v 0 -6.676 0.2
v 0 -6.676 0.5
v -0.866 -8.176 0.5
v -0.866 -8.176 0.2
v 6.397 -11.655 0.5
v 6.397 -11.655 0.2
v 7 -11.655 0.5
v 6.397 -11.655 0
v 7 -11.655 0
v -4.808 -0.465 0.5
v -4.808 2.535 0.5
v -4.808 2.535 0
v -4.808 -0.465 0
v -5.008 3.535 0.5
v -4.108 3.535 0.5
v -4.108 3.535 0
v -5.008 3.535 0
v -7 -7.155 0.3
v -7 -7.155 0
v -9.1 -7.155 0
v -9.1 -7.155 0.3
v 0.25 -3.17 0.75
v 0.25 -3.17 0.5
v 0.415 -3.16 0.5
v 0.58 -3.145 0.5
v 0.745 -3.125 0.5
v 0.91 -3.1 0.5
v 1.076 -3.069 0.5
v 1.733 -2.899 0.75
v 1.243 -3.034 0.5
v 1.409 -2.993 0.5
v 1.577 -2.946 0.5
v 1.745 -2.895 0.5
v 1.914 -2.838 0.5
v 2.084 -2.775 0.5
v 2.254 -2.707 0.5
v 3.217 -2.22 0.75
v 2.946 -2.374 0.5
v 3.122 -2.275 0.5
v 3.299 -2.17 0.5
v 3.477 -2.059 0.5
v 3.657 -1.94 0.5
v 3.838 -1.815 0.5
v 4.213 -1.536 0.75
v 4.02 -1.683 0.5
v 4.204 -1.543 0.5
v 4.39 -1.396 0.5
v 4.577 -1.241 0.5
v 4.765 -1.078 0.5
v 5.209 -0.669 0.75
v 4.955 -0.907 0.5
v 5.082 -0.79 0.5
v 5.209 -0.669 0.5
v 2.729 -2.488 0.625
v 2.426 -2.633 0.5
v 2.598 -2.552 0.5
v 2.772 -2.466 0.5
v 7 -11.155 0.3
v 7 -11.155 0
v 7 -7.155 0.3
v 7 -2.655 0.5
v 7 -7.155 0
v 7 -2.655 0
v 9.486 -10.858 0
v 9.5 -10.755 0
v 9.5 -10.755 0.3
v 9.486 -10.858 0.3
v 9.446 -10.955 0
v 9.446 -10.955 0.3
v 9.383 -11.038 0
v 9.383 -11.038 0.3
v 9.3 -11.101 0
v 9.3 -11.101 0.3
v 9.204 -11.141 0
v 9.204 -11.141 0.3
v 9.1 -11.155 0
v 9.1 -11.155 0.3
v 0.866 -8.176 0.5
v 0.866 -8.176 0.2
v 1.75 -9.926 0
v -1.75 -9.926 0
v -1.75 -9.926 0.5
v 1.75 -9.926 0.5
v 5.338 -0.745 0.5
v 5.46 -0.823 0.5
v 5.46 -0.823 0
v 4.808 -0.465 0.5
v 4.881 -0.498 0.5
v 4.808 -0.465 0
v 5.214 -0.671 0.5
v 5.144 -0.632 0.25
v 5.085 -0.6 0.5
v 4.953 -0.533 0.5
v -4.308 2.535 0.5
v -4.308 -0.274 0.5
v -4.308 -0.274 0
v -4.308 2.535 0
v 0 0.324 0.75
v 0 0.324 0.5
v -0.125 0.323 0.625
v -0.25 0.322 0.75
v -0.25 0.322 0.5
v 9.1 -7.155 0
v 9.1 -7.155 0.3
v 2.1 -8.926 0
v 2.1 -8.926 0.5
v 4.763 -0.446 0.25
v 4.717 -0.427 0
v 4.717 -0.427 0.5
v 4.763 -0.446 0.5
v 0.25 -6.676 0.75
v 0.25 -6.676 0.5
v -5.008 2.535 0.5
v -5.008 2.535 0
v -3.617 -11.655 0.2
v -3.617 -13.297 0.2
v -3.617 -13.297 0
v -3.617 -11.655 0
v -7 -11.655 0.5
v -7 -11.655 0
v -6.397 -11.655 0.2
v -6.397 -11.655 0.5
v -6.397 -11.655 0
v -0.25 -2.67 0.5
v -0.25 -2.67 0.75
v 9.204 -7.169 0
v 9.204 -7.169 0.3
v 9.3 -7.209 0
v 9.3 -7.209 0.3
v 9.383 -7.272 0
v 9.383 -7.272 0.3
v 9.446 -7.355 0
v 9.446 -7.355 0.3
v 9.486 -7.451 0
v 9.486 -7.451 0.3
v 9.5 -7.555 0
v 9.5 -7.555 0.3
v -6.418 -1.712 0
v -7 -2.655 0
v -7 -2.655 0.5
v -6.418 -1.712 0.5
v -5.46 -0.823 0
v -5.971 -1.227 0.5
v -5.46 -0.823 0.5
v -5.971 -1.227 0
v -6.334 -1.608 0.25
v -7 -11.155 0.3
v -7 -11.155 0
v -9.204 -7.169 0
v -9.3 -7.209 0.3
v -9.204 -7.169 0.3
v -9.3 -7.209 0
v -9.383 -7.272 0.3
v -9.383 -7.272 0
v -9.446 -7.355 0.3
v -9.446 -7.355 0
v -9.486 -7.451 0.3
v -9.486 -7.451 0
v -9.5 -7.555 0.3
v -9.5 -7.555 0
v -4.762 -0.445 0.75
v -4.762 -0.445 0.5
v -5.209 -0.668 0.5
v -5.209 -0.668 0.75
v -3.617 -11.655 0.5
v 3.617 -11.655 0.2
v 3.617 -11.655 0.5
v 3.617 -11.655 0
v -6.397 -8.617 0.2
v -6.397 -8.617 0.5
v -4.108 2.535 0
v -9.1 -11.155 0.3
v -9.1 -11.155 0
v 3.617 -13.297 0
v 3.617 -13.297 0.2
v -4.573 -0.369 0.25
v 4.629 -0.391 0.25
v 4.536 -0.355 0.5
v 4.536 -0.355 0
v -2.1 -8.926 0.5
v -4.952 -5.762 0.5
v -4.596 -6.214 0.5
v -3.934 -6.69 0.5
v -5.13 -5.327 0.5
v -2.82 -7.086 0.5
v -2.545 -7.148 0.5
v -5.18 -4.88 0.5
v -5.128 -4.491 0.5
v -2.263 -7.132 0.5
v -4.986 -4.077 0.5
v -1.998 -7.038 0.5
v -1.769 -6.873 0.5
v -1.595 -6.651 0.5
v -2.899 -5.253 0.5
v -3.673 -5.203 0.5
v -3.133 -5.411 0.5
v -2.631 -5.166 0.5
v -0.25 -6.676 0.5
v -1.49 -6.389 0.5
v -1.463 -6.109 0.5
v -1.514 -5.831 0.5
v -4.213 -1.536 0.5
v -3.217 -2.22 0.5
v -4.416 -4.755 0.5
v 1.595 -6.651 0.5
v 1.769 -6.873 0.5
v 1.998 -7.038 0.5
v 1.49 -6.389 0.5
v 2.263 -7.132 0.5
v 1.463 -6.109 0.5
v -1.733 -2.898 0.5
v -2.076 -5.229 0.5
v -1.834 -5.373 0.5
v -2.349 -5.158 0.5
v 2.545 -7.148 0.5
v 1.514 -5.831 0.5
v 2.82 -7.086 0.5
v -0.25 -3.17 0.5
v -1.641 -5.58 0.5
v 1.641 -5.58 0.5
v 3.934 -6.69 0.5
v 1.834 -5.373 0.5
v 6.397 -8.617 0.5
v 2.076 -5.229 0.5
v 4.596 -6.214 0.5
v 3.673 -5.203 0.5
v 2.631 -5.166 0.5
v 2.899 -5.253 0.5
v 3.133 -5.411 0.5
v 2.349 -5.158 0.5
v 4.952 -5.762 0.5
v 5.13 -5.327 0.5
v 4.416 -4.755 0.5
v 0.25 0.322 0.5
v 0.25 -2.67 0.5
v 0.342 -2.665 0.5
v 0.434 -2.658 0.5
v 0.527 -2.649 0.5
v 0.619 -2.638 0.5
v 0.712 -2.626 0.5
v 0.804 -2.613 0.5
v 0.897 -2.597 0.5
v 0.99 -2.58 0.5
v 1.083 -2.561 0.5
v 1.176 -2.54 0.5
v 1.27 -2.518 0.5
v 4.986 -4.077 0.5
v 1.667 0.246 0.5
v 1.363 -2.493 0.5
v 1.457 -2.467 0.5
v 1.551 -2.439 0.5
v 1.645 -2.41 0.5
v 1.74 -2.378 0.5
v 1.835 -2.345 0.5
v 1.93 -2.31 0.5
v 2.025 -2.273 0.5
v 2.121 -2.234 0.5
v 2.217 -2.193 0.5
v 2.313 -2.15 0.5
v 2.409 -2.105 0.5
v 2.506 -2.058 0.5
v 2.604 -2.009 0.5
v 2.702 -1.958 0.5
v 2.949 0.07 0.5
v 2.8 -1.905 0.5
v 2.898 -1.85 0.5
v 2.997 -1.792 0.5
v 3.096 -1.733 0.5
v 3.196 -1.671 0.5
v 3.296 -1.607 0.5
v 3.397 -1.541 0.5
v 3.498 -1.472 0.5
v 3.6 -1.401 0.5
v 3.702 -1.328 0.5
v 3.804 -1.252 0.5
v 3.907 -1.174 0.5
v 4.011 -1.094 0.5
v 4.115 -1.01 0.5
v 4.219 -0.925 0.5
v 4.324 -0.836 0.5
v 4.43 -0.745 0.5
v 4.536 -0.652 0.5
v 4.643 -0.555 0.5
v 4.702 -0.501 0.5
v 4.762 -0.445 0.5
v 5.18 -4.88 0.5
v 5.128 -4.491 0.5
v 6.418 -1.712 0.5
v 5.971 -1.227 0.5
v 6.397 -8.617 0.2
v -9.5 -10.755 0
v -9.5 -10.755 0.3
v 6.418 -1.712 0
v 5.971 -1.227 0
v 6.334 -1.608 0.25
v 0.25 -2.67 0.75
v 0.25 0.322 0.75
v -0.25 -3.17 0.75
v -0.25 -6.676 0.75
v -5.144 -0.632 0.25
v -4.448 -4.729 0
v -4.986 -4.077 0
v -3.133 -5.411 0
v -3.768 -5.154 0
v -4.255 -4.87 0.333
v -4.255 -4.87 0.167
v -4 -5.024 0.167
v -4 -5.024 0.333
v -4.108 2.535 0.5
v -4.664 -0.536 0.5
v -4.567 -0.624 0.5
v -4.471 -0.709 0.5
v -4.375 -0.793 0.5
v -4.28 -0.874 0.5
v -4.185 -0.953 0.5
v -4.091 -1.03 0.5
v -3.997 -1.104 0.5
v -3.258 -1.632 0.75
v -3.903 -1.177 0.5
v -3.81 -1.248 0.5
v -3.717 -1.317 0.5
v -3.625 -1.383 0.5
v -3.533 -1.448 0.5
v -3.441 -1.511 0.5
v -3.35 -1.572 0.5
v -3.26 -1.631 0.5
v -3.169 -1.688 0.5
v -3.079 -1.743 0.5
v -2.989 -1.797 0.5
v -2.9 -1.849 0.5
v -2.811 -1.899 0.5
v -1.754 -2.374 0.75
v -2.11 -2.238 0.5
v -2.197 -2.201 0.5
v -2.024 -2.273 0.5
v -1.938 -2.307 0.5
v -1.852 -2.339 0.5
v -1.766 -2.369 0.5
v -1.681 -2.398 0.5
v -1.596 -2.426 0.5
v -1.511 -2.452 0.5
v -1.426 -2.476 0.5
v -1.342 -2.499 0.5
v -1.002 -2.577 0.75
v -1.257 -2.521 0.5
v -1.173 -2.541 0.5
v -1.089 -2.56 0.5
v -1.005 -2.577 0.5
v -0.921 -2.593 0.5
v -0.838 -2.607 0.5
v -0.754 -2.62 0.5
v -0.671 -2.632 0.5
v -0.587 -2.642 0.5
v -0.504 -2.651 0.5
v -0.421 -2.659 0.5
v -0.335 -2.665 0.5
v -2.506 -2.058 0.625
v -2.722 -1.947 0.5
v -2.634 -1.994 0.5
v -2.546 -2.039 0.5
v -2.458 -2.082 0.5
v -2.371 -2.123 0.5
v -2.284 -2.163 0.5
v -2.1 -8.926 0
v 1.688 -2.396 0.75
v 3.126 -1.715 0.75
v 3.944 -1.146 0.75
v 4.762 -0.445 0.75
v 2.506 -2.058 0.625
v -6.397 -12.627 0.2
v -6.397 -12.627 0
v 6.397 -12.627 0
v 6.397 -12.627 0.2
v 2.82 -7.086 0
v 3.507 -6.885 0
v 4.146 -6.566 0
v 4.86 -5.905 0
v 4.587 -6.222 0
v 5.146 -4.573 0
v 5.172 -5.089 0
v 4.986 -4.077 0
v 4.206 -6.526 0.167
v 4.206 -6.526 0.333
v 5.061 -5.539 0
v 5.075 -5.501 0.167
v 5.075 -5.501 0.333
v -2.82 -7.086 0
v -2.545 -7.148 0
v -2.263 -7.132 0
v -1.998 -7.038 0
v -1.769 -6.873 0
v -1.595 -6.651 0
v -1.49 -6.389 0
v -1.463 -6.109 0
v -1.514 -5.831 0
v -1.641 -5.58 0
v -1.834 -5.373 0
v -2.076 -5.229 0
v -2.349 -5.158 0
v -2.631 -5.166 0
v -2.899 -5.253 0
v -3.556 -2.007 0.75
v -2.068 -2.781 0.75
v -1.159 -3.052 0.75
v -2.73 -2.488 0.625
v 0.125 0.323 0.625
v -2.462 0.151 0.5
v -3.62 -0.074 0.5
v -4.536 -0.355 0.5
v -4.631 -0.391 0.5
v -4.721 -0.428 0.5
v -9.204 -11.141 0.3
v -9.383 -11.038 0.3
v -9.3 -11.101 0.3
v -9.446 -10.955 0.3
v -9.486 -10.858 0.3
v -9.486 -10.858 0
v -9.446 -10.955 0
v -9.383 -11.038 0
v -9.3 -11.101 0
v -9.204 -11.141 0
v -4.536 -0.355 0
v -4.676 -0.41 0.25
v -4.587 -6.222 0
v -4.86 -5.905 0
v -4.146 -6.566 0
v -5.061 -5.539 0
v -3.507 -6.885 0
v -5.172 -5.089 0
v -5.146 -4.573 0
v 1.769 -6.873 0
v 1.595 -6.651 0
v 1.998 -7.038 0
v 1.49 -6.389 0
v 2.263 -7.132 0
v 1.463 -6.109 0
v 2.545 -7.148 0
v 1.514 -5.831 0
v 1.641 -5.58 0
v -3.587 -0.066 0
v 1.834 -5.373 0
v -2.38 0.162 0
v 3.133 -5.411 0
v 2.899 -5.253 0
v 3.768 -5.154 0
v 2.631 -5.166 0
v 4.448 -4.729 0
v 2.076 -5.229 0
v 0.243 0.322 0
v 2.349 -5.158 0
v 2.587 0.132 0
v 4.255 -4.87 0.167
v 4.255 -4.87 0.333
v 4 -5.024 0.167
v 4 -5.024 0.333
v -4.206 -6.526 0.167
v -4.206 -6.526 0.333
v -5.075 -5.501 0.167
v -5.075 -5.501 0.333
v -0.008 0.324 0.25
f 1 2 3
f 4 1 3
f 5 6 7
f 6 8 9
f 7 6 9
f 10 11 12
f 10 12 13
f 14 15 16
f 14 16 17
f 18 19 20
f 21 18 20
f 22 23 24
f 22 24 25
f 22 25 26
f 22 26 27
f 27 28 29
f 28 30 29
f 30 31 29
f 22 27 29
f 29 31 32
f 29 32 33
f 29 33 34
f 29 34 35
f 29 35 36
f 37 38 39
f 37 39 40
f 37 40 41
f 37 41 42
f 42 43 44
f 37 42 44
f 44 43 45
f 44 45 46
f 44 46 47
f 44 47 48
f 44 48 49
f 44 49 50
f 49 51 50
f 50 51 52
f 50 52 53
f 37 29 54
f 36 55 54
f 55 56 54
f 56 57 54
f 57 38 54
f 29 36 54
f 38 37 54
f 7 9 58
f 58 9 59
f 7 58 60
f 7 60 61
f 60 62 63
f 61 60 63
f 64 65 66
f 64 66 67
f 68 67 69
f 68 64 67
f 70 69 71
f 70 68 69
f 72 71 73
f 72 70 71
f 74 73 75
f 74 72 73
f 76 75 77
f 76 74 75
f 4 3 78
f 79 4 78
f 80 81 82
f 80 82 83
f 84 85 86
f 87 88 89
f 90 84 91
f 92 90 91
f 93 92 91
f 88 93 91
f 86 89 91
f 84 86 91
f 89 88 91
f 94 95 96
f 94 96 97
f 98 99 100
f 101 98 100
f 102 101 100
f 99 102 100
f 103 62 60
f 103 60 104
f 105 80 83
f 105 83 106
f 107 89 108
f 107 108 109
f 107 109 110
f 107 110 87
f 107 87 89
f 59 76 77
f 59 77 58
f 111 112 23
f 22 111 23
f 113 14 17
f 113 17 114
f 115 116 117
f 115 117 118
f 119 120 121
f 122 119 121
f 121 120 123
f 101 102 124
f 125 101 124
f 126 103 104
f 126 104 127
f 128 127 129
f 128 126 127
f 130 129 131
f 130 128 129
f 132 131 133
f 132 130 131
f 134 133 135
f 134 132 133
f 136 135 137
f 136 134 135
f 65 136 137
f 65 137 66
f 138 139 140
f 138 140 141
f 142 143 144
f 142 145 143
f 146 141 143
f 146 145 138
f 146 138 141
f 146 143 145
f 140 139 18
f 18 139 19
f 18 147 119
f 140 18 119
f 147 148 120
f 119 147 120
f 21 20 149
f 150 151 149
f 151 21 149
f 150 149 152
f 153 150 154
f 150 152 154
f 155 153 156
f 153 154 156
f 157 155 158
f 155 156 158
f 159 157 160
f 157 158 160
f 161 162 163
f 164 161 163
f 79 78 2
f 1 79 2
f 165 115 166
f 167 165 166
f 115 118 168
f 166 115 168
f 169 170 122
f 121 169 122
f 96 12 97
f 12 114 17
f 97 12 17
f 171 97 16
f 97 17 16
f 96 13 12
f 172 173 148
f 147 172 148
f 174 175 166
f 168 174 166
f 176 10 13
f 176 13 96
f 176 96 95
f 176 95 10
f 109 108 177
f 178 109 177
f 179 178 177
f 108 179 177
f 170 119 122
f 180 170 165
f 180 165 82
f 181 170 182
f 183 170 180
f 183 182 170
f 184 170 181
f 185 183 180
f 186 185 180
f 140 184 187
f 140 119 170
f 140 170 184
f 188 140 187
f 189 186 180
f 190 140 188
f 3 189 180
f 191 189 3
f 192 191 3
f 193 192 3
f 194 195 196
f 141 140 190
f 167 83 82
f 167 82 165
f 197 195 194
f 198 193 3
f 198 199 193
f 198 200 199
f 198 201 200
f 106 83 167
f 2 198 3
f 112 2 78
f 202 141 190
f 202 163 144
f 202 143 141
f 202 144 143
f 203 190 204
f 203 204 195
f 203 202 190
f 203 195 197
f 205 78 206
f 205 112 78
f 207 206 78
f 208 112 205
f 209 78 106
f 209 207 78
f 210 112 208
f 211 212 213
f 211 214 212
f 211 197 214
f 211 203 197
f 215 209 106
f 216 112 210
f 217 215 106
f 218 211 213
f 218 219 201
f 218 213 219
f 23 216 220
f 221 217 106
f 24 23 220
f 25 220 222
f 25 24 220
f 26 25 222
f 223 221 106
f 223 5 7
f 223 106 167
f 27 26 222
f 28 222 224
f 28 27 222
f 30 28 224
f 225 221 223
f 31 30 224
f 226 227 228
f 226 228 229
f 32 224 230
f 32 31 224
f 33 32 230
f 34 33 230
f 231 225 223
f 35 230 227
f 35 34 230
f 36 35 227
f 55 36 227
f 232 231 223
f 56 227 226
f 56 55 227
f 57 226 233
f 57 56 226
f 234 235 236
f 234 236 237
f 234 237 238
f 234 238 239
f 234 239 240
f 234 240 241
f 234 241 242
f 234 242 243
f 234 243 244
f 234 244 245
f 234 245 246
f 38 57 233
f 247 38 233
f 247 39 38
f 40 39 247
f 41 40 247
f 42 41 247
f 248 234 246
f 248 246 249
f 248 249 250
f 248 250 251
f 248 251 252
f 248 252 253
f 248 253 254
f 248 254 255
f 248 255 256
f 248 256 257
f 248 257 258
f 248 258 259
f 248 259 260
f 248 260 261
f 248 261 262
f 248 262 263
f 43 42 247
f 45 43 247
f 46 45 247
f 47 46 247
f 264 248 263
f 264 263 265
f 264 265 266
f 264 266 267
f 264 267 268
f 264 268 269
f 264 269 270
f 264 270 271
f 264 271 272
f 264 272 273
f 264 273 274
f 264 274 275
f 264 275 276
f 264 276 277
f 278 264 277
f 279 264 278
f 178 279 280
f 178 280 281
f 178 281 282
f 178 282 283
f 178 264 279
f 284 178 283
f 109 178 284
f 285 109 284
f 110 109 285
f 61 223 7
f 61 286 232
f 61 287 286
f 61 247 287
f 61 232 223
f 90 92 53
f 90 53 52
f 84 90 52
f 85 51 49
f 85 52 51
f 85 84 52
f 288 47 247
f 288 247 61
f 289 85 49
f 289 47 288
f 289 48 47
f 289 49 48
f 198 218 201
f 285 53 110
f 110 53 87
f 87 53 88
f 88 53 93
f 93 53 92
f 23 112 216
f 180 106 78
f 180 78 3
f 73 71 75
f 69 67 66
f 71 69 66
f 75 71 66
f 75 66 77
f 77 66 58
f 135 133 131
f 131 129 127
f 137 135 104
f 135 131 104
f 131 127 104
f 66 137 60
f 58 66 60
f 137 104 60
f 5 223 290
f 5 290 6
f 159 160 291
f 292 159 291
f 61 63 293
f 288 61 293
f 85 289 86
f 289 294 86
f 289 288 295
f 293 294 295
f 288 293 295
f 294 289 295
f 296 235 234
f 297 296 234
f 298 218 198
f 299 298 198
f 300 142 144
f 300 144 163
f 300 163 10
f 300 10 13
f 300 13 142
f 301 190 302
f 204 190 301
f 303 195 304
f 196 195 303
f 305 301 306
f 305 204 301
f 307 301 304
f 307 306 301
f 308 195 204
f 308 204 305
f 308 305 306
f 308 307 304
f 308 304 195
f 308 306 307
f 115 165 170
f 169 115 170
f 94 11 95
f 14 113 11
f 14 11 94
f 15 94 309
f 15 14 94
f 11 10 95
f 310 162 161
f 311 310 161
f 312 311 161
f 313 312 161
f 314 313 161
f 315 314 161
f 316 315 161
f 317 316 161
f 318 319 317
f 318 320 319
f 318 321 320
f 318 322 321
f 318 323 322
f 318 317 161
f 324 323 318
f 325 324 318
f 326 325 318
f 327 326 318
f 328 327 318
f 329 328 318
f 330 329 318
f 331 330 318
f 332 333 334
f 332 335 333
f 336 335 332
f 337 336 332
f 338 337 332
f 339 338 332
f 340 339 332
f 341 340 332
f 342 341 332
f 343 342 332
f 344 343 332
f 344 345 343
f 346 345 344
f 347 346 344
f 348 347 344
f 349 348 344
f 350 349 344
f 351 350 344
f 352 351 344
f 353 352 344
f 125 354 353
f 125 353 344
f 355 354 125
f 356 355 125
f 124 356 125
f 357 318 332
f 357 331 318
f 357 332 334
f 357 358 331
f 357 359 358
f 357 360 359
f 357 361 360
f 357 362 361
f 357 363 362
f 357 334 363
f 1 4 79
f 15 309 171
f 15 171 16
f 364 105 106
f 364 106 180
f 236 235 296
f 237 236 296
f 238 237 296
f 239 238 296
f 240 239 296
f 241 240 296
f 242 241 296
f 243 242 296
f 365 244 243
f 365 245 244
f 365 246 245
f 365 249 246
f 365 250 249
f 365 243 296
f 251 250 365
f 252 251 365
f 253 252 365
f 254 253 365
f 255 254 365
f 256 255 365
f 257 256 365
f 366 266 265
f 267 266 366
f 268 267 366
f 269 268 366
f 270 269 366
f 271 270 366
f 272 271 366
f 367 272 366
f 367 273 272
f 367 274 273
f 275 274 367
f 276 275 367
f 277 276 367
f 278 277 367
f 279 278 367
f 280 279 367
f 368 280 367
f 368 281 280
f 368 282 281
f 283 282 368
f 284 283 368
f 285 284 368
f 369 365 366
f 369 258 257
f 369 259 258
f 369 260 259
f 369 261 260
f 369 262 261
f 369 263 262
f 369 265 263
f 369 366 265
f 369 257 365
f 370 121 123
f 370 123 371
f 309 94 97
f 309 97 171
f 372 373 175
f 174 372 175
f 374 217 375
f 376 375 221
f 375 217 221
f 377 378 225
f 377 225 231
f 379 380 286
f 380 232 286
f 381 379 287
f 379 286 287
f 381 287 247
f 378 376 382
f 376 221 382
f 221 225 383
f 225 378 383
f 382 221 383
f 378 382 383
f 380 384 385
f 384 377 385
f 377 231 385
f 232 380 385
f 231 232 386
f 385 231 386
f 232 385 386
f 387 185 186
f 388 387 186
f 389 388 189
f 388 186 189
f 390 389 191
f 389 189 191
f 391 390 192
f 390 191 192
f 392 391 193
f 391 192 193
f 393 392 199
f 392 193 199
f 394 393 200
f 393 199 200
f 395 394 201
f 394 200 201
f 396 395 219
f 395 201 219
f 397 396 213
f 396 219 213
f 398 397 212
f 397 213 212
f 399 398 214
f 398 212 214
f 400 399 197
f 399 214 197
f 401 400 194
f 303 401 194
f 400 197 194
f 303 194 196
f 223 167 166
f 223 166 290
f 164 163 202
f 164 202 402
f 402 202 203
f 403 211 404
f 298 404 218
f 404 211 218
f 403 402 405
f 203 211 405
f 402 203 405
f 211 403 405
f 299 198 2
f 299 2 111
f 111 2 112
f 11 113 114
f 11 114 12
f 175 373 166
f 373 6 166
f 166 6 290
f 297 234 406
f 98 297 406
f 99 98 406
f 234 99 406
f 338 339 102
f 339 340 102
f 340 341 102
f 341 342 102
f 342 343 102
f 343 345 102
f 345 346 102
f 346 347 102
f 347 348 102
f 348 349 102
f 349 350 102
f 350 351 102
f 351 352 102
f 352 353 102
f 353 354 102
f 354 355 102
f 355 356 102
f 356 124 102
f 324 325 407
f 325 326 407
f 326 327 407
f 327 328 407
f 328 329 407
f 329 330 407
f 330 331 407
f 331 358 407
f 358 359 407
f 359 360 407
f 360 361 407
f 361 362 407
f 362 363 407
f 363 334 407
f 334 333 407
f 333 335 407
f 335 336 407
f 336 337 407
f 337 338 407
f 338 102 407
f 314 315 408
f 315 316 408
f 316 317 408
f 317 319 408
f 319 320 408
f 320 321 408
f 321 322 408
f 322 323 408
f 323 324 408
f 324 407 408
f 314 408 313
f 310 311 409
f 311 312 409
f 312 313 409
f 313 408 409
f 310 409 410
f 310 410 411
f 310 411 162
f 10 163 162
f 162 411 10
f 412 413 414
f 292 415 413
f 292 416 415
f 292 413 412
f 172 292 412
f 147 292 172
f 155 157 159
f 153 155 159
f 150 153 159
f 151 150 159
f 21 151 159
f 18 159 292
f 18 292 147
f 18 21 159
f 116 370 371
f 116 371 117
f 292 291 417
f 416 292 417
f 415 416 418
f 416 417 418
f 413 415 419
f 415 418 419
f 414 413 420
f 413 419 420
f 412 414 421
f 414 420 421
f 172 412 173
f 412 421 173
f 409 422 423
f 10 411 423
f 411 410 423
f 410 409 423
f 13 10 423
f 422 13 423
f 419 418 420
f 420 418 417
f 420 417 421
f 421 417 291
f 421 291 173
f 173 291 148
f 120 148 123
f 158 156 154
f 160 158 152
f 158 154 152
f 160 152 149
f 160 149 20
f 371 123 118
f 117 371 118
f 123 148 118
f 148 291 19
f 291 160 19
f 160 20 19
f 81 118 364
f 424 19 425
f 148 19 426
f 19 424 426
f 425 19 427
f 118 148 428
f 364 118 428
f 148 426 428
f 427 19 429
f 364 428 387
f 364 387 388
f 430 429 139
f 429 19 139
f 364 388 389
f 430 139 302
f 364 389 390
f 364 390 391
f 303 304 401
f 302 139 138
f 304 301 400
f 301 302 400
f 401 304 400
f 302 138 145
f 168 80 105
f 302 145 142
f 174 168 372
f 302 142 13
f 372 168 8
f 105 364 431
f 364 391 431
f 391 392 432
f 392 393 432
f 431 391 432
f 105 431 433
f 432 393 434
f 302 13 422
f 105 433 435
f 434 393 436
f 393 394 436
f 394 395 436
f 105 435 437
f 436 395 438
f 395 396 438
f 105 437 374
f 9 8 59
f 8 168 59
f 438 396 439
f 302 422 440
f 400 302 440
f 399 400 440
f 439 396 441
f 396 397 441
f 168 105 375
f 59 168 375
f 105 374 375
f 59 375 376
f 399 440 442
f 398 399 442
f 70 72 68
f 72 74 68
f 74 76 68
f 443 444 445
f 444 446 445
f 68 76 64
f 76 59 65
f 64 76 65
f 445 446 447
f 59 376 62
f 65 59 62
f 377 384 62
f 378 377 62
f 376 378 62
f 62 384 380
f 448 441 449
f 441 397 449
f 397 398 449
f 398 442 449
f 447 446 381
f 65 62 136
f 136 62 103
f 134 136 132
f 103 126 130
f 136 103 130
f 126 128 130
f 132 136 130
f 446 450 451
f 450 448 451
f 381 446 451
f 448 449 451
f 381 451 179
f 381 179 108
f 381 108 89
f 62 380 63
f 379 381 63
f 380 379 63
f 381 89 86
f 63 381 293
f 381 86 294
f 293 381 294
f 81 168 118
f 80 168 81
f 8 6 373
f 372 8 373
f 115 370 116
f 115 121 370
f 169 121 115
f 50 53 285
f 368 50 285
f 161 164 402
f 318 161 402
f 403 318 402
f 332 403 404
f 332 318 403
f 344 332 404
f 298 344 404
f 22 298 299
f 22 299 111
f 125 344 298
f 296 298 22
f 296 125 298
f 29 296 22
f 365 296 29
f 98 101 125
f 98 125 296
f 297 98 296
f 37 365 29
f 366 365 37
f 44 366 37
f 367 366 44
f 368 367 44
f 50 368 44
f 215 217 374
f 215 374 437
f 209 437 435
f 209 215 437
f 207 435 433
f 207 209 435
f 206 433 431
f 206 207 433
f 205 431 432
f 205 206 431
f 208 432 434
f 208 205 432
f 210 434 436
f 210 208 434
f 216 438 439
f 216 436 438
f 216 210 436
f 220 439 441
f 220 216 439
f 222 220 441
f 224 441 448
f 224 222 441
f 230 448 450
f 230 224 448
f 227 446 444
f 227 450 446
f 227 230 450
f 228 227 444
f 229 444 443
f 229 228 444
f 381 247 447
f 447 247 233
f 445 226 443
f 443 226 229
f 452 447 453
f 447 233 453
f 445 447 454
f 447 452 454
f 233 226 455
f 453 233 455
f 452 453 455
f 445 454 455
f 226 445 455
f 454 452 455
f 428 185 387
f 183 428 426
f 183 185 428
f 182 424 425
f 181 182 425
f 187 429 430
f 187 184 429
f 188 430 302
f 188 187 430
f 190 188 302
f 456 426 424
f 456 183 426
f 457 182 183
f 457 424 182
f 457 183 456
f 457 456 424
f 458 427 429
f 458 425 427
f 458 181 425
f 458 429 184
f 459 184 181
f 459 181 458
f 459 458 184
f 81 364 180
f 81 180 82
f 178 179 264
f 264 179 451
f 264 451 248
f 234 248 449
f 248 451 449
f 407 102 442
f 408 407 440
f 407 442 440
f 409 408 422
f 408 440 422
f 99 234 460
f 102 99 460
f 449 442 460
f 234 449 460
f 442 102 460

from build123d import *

# Parameters (mm, degrees)
SALIENTE_EXTRUIR1_DEPTH    = 0.5
SALIENTE_EXTRUIR3_DEPTH    = 0.25
CROQUIS3_W                 = 2.5
CROQUIS3_H                 = 4
CORTAR_EXTRUIR1_DEPTH      = 0.2
CORTAR_EXTRUIR2_DEPTH      = 16.044499449
CORTAR_EXTRUIR3_DEPTH      = 0.3
CROQUIS6_W                 = 0.5
CROQUIS6_H                 = 0.5
SALIENTE_EXTRUIR4_DEPTH    = 0.5
SALIENTE_EXTRUIR5_DEPTH    = 0.5
CORTAR_EXTRUIR4_DEPTH      = 0.3
CORTAR_EXTRUIR6_DEPTH      = 17.351359419
CORTAR_EXTRUIR6_DEPTH_BACK = 17.351359419


with BuildPart() as part:
    # Croquis1 → Saliente-Extruir1 (new body)
    with BuildSketch(Plane.XY):
        with BuildLine():
            add(Edge.make_bspline(
                [(-7, -2.654911382), (-6.43729165, -1.477773663), (-5.459968138, -0.823437035)],
                knots=[0, 0, 0, 0.697899527, 0.697899527, 0.697899527], degree=2))
            Line((-7, -2.654911382), (-7, -7.154911382))
            Line((-7, -7.154911382), (-7, -11.154911382))
            Line((-7, -11.154911382), (-7, -11.654911382))
            Line((-7, -11.654911382), (7, -11.654911382))
            Line((7, -11.654911382), (7, -2.654911382))
            add(Edge.make_bspline(
                [(7, -2.654911382), (6.4475595, -1.500710504), (5.493472653, -0.847655691)],
                knots=[0, 0, 0, 0.686055161, 0.686055161, 0.686055161], degree=2))
            add(Edge.make_bspline(
                [(5.493472653, -0.847655691), (5.133927957, -0.601553992), (4.717344015, -0.426621853)],
                knots=[0.686055161, 0.686055161, 0.686055161, 0.94459294, 0.94459294, 0.94459294], degree=2))
            add(Edge.make_bspline(
                [(4.717344015, -0.426621853), (4.629325683, -0.390064605), (4.536168631, -0.354911382)],
                knots=[0.711833375, 0.711833375, 0.711833375, 0.762765806, 0.762765806, 0.762765806], degree=2, weights=[0.869674597, 0.859955694, 0.850817623]))
            add(Edge.make_bspline(
                [(4.536168631, -0.354911382), (0, 1.356831766), (-4.536168631, -0.354911382)],
                knots=[0.762765806, 0.762765806, 0.762765806, 2.379801035, 2.379801035, 2.379801035], degree=2, weights=[0.850817623, 0.560696315, 0.856038911]))
            add(Edge.make_bspline(
                [(-4.536168631, -0.354911382), (-4.678190069, -0.408503796), (-4.808150811, -0.465309533)],
                knots=[2.379801035, 2.379801035, 2.379801035, 2.458391875, 2.458391875, 2.458391875], degree=2, weights=[0.856038911, 0.870393096, 0.886130226]))
            add(Edge.make_bspline(
                [(-5.459968138, -0.823437035), (-5.15433365, -0.618808948), (-4.808150811, -0.465309533)],
                knots=[0.697899527, 0.697899527, 0.697899527, 0.916150865, 0.916150865, 0.916150865], degree=2))
        make_face()
        with BuildLine():
            Line((-7, -11.154911382), (-7, -7.154911382))
            Line((-7, -7.154911382), (-9.1, -7.154911382))
            ThreePointArc((-9.1, -7.154911382), (-9.382842712, -7.27206867), (-9.5, -7.554911382))
            Line((-9.5, -7.554911382), (-9.5, -10.754911382))
            ThreePointArc((-9.5, -10.754911382), (-9.382842712, -11.037754095), (-9.1, -11.154911382))
            Line((-9.1, -11.154911382), (-7, -11.154911382))
        make_face()
    saliente_extruir1 = extrude(amount=SALIENTE_EXTRUIR1_DEPTH)

    # Croquis2 → Saliente-Extruir3 (add)
    with BuildSketch(Plane.XY.offset(0.5)):
        with BuildLine():
            add(Edge.make_bspline(
                [(-5.209274341, -0.668087715), (-2.729702745, -3.055789139), (-0.25, -3.170426724)],
                knots=[0, 0, 0, 0.476040387, 0.476040387, 0.476040387], degree=2))
            Line((-0.25, -3.170426724), (-0.25, -2.670058896))
            add(Edge.make_bspline(
                [(-4.761570767, -0.44546357), (-2.505785384, -2.559085938), (-0.25, -2.670058896)],
                knots=[0, 0, 0, 0.473748159, 0.473748159, 0.473748159], degree=2))
            Line((-4.761570767, -0.44546357), (-5.209274341, -0.668087715))
        make_face()
        with BuildLine():
            Line((0.25, -2.670058896), (0.25, -3.170437695))
            add(Edge.make_bspline(
                [(0.25, -3.170437695), (2.729328728, -3.055926808), (5.208788565, -0.669061964)],
                knots=[0.524033953, 0.524033953, 0.524033953, 1, 1, 1], degree=2))
            Line((5.208788565, -0.669061964), (4.761570767, -0.44546357))
            add(Edge.make_bspline(
                [(0.25, -2.670058896), (2.505785384, -2.559085938), (4.761570767, -0.44546357)],
                knots=[0.526251841, 0.526251841, 0.526251841, 1, 1, 1], degree=2))
        make_face()
        with BuildLine():
            Line((-0.25, -3.170426724), (-0.25, -6.676208248))
            Line((-0.25, -6.676208248), (0.25, -6.676208248))
            Line((0.25, -6.676208248), (0.25, -3.170437695))
            add(Edge.make_bspline(
                [(-0.25, -3.170426724), (-6.67e-07, -3.181984287), (0.25, -3.170437695)],
                knots=[0.476040387, 0.476040387, 0.476040387, 0.524033953, 0.524033953, 0.524033953], degree=2))
        make_face()
        with BuildLine():
            Line((-0.25, 0.322083073), (-0.25, -2.670058896))
            add(Edge.make_bspline(
                [(-0.25, -2.670058896), (0, -2.682357601), (0.25, -2.670058896)],
                knots=[0.473748159, 0.473748159, 0.473748159, 0.526251841, 0.526251841, 0.526251841], degree=2))
            Line((0.25, -2.670058896), (0.25, 0.322083073))
            add(Edge.make_bspline(
                [(0.25, 0.322083073), (0.125054487, 0.323791745), (9.86e-07, 0.323791752)],
                knots=[1.53302484, 1.53302484, 1.53302484, 1.571666911, 1.571666911, 1.571666911], degree=2, weights=[0.806098269, 0.805646815, 0.805543419]))
            add(Edge.make_bspline(
                [(9.86e-07, 0.323791752), (-0.125053501, 0.323791758), (-0.25, 0.322083073)],
                knots=[1.571666911, 1.571666911, 1.571666911, 1.61029937, 1.61029937, 1.61029937], degree=2, weights=[0.805543419, 0.805440049, 0.805684563]))
        make_face()
        with BuildLine():
            Line((-0.25, -2.670058896), (-0.25, -3.170426724))
            add(Edge.make_bspline(
                [(-0.25, -3.170426724), (-6.67e-07, -3.181984287), (0.25, -3.170437695)],
                knots=[0.476040387, 0.476040387, 0.476040387, 0.524033953, 0.524033953, 0.524033953], degree=2))
            Line((0.25, -3.170437695), (0.25, -2.670058896))
            add(Edge.make_bspline(
                [(-0.25, -2.670058896), (0, -2.682357601), (0.25, -2.670058896)],
                knots=[0.473748159, 0.473748159, 0.473748159, 0.526251841, 0.526251841, 0.526251841], degree=2))
        make_face()
    extrude(amount=SALIENTE_EXTRUIR3_DEPTH)

    # Croquis3 → Cortar-Extruir1 (cut)
    with BuildSketch(Plane.XY.offset(0.5)):
        with Locations((-8.25, -9.154911382)):
            Rectangle(CROQUIS3_W, CROQUIS3_H)
    cortar_extruir1 = extrude(amount=-CORTAR_EXTRUIR1_DEPTH, mode=Mode.SUBTRACT)

    # Simetría4: Saliente-Extruir1, Cortar-Extruir1 across plane
    add(saliente_extruir1.mirror(Plane(origin=(0, 0, 0), x_dir=(0, 0, 1), z_dir=(1, 0, 0))))
    add(cortar_extruir1.mirror(Plane(origin=(0, 0, 0), x_dir=(0, 0, 1), z_dir=(1, 0, 0))), mode=Mode.SUBTRACT)

    # Croquis4 → Cortar-Extruir2 (cut, through all)
    with BuildSketch(Plane.XY.offset(0.5)):
        with BuildLine():
            ThreePointArc((-2.819816225, -7.085512289), (-1.478612147, -5.968150706), (-3.132859694, -5.410664974))
            add(Edge.make_bspline(
                [(-4.985974264, -4.077116226), (-4.656618425, -4.531627284), (-4.528206239, -4.71316852), (-3.588188991, -5.268300344), (-3.515962957, -5.276366331), (-3.132859694, -5.410664974)],
                knots=[0, 0, 0, 0, 0.376187305, 0.476187305, 1, 1, 1, 1], degree=3))
            add(Edge.make_bspline(
                [(-2.819816225, -7.085512289), (-4.318509024, -6.781423826), (-5.701470772, -5.678827367), (-4.985974264, -4.077116226)],
                knots=[0, 0, 0, 0, 1, 1, 1, 1], degree=3))
        make_face()
    cortar_extruir2 = extrude(amount=-CORTAR_EXTRUIR2_DEPTH, mode=Mode.SUBTRACT)

    # Croquis5 → Cortar-Extruir3 (cut)
    with BuildSketch(Plane.XY.offset(0.5)):
        Polygon((0.866025404, -8.176208248), (0, -6.676208248), (-0.866025404, -8.176208248), align=None)
        Polygon((-2.1, -8.926208248), (2.1, -8.926208248), (1.75, -9.926208248), (-1.75, -9.926208248), align=None)
    extrude(amount=-CORTAR_EXTRUIR3_DEPTH, mode=Mode.SUBTRACT)

    # Croquis7 → Saliente-Extruir5 (add)
    with BuildSketch(Plane.XY.offset(0.5)):
        Polygon((-6.396790084, -8.616522375), (-6.396790084, -12.627419512), (-3.617369223, -13.297159478), (-3.617369223, -11.654911382), align=None)
    saliente_extruir5 = extrude(amount=-SALIENTE_EXTRUIR5_DEPTH)

    # Croquis8 → Cortar-Extruir4 (cut)
    with BuildSketch(Plane.XY.offset(0.5)):
        Polygon((-6.396790084, -12.627419512), (-3.617369223, -13.297159478), (-3.617369223, -11.654911382), (-6.396790084, -8.616522375), align=None)
    cortar_extruir4 = extrude(amount=-CORTAR_EXTRUIR4_DEPTH, mode=Mode.SUBTRACT)

    # Simetría3: Cortar-Extruir2, Saliente-Extruir5, Cortar-Extruir4 across plane
    add(cortar_extruir2.mirror(Plane(origin=(0, 0, 0), x_dir=(0, 0, 1), z_dir=(1, 0, 0))), mode=Mode.SUBTRACT)
    add(saliente_extruir5.mirror(Plane(origin=(0, 0, 0), x_dir=(0, 0, 1), z_dir=(1, 0, 0))))
    add(cortar_extruir4.mirror(Plane(origin=(0, 0, 0), x_dir=(0, 0, 1), z_dir=(1, 0, 0))), mode=Mode.SUBTRACT)

    # Croquis10 → Cortar-Extruir6 (cut, two sides: drawn at the far end of the back side and taken through both)
    with BuildSketch(Plane.XY.offset(0.2).offset(-CORTAR_EXTRUIR6_DEPTH_BACK)):
        Polygon((-1.75, -9.926208248), (1.75, -9.926208248), (2.1, -8.926208248), (-2.1, -8.926208248), align=None)
    extrude(amount=CORTAR_EXTRUIR6_DEPTH + CORTAR_EXTRUIR6_DEPTH_BACK, mode=Mode.SUBTRACT)


with BuildPart() as body_2:
    # Croquis6 → Saliente-Extruir4 (new body)
    with BuildSketch(Plane.XY.offset(0.5)):
        with BuildLine():
            Line((-4.808150811, 2.534690467), (-4.808150811, -0.465309533))
            add(Edge.make_bspline(
                [(-4.808150811, -0.465309533), (-4.587296252, -0.368045953), (-4.308150811, -0.273574887)],
                knots=[0, 0, 0, 0.301704939, 0.301704939, 0.301704939], degree=2))
            Line((-4.308150811, -0.273574887), (-4.308150811, 2.534690467))
            Line((-4.308150811, 2.534690467), (-4.808150811, 2.534690467))
        make_face()
        Polygon((-5.008150811, 2.534690467), (-4.808150811, 2.534690467), (-4.808150811, 3.034690467), (-4.308150811, 3.034690467), (-4.308150811, 2.534690467), (-4.108150811, 2.534690467), (-4.108150811, 3.534690467), (-5.008150811, 3.534690467), align=None)
        with Locations((-4.558150811, 2.784690467)):
            Rectangle(CROQUIS6_W, CROQUIS6_H)
    extrude(amount=-SALIENTE_EXTRUIR4_DEPTH)


solid = Compound([part.part, body_2.part])
